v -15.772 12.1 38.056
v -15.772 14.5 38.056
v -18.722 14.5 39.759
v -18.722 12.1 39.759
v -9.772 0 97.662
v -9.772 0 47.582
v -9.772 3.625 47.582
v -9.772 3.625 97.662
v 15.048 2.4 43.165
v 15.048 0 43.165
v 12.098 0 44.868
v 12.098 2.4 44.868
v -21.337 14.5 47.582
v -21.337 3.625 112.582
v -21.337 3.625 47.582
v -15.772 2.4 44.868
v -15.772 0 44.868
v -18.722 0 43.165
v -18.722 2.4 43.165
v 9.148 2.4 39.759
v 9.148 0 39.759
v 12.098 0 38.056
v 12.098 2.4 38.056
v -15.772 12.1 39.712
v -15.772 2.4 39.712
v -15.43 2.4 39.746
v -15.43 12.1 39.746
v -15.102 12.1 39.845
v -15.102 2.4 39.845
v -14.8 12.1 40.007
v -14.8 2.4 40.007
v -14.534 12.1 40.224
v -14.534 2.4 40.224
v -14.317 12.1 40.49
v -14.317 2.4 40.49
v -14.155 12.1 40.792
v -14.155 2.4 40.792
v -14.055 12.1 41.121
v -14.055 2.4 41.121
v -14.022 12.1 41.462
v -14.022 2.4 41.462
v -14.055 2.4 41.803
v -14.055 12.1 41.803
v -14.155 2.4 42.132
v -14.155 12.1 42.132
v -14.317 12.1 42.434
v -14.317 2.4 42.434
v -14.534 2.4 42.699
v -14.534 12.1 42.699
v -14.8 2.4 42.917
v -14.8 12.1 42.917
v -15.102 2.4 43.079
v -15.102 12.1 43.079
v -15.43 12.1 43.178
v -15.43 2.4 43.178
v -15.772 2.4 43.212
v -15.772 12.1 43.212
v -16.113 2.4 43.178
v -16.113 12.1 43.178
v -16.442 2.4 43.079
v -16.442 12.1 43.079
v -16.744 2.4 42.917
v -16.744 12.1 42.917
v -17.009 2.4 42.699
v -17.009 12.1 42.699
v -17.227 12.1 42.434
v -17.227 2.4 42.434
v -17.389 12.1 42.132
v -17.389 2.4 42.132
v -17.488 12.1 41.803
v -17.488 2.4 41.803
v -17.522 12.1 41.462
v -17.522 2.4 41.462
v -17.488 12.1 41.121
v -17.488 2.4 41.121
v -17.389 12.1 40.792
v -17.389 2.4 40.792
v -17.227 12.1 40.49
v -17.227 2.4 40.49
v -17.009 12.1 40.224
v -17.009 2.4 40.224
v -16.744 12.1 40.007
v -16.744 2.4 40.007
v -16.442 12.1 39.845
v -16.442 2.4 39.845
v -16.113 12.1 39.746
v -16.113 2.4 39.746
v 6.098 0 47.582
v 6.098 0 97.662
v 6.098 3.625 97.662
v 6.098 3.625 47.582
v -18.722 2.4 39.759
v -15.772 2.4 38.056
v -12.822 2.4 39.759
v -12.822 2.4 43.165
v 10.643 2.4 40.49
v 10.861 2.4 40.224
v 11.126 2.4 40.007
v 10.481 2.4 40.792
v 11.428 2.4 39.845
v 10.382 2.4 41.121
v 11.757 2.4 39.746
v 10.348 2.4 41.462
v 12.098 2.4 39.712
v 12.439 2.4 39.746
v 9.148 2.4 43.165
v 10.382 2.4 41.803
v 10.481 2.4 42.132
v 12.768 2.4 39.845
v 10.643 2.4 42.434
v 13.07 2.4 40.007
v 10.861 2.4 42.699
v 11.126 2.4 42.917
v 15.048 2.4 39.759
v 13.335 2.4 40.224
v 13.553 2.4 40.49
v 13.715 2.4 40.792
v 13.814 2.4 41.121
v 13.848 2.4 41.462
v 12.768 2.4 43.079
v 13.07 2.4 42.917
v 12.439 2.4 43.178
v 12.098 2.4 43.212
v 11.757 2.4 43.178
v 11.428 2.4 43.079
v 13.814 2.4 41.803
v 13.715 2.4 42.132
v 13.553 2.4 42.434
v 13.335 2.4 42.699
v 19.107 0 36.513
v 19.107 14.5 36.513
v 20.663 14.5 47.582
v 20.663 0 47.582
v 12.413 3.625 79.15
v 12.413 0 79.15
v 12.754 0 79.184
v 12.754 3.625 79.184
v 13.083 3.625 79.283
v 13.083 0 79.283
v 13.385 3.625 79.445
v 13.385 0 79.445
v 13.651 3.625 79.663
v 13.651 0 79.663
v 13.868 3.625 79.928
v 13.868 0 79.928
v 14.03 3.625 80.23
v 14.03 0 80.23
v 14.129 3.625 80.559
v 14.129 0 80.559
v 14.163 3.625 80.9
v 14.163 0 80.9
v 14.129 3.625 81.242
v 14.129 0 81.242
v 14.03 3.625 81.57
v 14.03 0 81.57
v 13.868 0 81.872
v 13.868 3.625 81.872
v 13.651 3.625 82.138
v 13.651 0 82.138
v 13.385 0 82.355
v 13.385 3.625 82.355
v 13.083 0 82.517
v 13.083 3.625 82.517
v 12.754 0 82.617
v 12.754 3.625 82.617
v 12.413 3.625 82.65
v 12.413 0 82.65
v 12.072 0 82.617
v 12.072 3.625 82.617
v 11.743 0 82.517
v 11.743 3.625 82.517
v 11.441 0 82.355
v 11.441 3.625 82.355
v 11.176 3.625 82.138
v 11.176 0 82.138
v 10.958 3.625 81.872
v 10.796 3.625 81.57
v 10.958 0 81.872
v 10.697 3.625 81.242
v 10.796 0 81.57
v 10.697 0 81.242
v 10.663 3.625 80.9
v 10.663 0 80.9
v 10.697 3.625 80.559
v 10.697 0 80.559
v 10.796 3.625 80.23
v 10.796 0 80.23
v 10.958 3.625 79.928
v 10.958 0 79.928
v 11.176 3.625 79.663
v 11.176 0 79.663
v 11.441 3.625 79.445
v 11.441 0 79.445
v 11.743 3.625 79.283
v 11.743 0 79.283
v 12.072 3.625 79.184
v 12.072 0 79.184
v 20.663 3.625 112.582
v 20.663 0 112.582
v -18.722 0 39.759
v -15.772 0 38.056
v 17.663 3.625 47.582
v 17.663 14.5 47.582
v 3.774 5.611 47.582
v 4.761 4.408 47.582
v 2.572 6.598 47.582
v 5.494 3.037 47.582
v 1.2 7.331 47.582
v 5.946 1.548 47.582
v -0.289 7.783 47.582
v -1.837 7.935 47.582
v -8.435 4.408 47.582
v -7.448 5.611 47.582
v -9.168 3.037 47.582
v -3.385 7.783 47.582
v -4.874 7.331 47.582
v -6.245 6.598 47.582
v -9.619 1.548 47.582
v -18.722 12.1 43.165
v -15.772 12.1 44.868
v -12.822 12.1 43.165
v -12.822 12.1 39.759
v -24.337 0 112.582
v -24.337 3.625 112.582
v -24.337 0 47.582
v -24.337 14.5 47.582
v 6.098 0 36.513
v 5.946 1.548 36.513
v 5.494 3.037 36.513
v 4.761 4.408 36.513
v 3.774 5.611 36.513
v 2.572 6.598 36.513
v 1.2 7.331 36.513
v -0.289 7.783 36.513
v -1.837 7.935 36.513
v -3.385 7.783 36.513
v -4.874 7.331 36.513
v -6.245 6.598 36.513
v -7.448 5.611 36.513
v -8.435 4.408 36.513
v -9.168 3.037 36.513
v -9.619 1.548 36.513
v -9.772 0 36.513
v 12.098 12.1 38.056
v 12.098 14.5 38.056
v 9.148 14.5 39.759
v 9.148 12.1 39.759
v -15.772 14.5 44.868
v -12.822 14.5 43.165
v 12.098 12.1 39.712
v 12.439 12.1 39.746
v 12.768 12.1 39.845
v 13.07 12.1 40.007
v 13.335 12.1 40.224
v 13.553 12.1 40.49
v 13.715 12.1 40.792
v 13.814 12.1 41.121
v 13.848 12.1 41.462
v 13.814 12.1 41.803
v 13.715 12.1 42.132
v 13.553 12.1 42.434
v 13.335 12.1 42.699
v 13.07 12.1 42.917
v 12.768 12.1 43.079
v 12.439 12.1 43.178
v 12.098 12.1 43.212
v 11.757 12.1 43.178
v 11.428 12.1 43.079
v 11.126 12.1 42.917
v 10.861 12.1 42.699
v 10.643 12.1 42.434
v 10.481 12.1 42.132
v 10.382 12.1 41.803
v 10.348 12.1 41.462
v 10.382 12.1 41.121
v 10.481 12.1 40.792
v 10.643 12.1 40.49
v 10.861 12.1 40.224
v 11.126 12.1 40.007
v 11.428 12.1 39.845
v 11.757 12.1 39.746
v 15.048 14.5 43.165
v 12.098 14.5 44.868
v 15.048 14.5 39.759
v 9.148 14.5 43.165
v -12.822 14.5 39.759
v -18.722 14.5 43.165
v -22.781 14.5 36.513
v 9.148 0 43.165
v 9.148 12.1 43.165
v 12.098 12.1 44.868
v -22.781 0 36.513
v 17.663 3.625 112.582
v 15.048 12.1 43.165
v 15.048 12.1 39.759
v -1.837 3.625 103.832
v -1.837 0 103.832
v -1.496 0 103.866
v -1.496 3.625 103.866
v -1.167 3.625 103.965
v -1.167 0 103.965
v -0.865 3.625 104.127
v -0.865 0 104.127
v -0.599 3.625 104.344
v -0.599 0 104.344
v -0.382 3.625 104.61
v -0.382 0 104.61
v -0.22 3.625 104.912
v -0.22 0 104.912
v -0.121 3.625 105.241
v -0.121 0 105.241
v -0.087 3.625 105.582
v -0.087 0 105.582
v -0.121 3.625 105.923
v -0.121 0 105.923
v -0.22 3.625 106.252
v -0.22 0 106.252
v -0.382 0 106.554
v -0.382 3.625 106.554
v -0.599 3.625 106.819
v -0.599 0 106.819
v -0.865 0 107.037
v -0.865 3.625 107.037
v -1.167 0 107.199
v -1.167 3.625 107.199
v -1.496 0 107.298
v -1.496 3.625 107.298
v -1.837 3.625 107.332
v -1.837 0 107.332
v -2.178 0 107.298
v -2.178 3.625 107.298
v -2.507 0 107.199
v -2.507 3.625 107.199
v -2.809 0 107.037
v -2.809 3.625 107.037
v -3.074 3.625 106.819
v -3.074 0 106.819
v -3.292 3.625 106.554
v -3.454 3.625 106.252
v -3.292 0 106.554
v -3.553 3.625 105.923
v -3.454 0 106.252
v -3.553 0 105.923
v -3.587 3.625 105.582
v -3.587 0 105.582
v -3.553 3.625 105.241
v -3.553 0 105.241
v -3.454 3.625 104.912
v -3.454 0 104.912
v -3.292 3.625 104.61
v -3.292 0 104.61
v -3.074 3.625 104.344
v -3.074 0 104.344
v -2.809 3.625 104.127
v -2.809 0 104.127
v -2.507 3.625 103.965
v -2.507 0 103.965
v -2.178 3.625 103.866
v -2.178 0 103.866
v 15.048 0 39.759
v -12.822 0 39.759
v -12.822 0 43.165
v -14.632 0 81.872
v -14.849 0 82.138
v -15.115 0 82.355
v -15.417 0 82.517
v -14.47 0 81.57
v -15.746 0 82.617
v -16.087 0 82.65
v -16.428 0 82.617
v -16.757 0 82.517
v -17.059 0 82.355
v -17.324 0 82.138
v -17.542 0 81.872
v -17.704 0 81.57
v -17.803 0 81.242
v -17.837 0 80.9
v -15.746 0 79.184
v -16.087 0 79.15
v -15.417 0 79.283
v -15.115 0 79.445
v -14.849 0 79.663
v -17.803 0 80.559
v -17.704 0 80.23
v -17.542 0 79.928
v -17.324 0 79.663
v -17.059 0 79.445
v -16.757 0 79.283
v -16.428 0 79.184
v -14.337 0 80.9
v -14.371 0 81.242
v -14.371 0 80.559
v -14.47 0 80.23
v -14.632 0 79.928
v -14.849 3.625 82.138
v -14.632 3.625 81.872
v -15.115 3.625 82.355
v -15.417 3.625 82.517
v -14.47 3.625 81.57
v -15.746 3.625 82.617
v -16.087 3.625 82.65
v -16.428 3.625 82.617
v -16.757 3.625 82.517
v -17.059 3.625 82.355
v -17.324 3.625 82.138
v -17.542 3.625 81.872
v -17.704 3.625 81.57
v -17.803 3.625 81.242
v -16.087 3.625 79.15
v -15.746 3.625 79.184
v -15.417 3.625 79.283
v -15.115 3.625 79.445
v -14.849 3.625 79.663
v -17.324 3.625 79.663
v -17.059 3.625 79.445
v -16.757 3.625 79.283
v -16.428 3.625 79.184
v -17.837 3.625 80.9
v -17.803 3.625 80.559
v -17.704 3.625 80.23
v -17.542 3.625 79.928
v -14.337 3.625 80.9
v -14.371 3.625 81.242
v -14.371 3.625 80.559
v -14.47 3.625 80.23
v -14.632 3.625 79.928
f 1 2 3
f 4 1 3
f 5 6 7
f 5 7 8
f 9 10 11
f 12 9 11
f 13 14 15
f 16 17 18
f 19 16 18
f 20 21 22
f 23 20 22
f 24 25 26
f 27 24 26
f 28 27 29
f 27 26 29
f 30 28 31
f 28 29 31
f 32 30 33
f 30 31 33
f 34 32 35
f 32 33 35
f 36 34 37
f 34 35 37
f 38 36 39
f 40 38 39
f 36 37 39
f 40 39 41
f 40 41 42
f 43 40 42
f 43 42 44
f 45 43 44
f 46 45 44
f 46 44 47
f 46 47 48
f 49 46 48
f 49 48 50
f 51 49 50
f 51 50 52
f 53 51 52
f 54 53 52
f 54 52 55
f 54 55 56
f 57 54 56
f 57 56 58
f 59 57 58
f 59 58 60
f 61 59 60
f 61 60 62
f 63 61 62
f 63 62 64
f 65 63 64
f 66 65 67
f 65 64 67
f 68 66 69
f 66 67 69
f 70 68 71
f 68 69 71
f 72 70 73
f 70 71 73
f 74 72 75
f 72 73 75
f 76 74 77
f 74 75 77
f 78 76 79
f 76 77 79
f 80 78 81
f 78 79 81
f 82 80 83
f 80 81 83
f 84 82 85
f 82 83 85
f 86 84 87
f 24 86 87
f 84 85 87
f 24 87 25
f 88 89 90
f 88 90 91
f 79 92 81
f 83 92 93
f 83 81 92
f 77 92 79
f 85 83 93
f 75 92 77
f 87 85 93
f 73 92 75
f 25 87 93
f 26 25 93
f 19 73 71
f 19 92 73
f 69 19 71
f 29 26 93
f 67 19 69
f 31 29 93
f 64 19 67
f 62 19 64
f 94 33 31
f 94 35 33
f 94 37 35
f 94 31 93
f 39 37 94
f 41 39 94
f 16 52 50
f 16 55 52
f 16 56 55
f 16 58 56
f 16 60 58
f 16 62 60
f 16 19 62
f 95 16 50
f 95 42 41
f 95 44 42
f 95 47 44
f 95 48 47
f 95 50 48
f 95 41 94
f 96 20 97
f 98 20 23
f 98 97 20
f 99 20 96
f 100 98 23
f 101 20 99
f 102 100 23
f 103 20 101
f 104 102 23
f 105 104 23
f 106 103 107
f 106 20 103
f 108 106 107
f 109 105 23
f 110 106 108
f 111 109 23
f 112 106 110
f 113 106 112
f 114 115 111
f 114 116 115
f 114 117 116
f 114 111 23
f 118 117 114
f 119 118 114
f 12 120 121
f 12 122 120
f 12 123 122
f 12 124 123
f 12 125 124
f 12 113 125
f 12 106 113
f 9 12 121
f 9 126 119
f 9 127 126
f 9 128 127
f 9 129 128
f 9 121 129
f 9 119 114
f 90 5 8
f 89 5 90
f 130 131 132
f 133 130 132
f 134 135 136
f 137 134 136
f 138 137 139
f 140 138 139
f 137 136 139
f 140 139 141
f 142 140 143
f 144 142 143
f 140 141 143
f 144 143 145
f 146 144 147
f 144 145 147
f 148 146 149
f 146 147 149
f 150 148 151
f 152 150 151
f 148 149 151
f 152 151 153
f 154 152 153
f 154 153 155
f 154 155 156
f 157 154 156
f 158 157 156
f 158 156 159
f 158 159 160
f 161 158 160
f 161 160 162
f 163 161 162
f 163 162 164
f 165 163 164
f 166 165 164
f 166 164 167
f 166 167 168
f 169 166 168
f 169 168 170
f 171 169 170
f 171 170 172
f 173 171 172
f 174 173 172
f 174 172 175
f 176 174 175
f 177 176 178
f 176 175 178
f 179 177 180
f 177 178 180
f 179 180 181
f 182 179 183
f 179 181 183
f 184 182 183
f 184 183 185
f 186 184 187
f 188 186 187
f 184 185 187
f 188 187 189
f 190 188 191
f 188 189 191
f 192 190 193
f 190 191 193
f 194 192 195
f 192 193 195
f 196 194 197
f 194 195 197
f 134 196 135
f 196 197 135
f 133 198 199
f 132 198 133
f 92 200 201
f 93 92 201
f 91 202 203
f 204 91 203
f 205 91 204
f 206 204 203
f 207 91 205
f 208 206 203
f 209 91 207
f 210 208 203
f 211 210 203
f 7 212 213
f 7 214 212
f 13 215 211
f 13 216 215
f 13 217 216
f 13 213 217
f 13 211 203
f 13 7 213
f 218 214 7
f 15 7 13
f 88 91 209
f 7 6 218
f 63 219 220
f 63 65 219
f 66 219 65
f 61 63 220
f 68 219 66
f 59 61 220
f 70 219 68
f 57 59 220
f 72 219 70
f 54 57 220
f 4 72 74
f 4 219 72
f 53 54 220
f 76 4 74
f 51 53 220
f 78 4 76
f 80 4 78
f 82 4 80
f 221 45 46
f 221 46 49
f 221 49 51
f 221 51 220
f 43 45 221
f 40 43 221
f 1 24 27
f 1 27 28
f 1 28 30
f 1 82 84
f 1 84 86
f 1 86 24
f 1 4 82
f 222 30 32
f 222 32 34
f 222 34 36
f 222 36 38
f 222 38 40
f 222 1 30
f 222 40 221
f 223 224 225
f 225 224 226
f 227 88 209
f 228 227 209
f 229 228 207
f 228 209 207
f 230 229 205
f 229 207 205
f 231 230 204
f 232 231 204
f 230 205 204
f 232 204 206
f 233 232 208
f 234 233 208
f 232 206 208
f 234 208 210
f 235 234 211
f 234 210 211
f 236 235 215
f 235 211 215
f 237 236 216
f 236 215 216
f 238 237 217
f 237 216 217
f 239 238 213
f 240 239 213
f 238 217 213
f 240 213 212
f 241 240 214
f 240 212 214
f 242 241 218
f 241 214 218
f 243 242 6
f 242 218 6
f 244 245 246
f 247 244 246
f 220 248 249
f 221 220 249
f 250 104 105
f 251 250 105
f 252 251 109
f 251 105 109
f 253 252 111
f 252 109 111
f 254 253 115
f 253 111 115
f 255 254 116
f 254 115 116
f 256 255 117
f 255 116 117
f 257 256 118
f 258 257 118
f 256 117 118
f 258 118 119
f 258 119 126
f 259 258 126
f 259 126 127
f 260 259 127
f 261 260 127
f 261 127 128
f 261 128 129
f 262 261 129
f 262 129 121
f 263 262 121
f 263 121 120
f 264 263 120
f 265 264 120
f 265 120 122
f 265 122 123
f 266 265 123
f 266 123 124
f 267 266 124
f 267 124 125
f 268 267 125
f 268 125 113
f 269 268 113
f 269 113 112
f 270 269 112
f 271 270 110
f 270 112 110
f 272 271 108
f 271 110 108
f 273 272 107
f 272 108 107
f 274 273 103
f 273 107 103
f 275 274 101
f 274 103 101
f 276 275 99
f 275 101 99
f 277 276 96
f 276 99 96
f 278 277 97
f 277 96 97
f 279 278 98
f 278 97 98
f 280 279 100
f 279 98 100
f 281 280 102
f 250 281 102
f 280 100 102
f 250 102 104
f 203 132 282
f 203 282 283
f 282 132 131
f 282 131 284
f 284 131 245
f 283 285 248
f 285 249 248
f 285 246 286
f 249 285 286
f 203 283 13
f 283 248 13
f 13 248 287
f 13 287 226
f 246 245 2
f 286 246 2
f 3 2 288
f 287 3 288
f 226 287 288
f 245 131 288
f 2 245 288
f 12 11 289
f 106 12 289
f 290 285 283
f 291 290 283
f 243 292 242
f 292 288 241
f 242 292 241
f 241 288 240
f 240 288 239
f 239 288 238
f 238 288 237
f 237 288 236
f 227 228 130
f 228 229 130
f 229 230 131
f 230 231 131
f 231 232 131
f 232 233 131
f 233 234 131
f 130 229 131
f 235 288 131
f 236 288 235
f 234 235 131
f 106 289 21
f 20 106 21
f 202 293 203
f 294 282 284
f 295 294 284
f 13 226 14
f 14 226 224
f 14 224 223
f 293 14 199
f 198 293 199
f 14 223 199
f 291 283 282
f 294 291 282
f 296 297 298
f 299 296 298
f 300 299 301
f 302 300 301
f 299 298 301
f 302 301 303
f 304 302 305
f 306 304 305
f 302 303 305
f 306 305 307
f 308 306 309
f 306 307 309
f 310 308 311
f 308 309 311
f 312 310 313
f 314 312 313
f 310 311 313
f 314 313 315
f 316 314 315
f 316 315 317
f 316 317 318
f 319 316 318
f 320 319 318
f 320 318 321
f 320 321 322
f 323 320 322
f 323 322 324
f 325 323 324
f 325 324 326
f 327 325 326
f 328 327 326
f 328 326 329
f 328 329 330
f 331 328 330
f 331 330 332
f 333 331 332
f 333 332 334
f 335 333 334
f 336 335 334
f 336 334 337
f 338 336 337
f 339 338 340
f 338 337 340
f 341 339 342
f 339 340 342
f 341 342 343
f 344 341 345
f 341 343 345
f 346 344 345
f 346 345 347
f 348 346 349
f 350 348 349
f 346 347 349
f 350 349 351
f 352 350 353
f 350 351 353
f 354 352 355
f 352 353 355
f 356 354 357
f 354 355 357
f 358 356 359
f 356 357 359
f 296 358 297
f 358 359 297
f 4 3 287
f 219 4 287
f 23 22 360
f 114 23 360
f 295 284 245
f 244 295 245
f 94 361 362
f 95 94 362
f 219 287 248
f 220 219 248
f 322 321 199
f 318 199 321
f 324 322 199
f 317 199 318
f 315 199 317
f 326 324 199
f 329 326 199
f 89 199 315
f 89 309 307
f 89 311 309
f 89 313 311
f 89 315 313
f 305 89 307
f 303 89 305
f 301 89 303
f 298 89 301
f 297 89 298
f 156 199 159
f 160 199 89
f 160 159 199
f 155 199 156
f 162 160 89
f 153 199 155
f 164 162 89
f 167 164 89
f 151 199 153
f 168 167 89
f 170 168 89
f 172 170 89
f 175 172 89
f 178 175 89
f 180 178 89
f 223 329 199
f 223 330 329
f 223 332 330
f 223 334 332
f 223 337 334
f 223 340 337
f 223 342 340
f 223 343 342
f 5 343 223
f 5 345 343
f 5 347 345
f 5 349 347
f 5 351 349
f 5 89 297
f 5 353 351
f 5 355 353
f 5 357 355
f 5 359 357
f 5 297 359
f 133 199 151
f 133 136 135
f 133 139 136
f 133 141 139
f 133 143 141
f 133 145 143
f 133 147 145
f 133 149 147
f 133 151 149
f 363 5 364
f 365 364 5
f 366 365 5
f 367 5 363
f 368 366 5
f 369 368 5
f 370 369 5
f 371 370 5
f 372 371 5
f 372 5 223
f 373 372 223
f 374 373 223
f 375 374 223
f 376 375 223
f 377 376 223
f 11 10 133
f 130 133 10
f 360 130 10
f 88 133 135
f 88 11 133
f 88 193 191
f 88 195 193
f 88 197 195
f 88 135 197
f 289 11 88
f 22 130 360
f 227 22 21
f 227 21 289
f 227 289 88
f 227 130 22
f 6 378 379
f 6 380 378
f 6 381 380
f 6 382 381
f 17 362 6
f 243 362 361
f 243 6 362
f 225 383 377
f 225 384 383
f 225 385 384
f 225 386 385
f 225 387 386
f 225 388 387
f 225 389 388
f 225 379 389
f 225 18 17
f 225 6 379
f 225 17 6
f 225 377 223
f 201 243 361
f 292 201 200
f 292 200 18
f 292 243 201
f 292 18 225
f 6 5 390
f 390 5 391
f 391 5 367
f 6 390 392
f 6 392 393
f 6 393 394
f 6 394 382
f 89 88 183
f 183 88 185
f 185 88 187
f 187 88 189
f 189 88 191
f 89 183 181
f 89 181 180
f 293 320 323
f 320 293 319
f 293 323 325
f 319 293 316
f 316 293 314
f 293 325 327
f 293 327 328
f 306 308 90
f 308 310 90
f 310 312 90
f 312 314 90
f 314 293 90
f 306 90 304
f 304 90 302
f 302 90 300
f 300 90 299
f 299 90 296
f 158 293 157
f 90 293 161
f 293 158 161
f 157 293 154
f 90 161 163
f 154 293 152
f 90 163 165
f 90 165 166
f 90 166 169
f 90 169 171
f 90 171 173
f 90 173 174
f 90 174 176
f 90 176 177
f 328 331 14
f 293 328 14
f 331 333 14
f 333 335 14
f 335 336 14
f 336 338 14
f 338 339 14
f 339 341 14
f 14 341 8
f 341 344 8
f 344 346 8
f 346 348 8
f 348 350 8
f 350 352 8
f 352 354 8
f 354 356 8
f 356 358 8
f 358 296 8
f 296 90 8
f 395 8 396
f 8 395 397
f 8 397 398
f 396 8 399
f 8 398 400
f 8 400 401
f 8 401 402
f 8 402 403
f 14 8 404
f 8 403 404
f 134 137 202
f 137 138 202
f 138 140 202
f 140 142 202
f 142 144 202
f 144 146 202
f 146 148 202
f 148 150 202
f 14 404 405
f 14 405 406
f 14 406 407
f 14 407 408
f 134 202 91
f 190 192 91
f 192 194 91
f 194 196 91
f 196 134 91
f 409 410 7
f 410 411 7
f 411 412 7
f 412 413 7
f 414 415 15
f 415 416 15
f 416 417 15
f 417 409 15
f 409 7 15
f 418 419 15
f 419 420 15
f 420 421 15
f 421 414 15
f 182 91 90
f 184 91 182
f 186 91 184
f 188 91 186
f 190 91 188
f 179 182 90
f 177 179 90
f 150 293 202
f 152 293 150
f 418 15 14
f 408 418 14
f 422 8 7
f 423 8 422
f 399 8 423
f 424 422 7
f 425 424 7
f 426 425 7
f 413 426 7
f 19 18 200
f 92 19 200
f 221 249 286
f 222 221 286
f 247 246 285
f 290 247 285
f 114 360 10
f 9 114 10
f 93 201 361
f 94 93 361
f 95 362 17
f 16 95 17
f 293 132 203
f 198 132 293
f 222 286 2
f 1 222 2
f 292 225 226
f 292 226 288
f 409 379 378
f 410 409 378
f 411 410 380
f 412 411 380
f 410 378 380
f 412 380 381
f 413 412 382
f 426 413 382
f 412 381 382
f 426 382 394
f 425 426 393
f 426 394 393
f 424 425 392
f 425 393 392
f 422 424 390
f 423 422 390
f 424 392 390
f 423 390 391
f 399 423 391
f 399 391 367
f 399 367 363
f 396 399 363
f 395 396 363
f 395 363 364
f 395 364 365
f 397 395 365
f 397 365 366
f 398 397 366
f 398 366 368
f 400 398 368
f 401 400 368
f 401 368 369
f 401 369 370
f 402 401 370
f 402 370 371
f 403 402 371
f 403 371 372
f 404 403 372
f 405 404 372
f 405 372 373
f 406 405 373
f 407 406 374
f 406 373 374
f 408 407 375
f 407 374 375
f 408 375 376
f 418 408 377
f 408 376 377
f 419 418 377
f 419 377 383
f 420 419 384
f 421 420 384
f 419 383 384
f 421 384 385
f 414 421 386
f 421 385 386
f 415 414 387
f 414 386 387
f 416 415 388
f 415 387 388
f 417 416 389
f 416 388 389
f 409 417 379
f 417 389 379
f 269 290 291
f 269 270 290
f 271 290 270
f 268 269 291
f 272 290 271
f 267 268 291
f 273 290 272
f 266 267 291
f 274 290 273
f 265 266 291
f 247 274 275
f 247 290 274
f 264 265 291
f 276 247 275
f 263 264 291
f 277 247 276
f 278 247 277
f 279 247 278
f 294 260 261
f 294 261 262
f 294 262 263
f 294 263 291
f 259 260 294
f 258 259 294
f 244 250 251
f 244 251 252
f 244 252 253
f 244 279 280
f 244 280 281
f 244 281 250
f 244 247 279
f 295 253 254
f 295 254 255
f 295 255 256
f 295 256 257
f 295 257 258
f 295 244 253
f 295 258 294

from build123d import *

# Parameters (mm, degrees)
BOSS_EXTRUDE3_DEPTH              = 14.5
SKETCH8_R                        = 7.935
CUT_EXTRUDE3_DEPTH               = 88
CUT_EXTRUDE9_DEPTH               = 2.4
F_39_0_13779528_DIAMETER_HOLE1_D = 3.500000112
CUT_EXTRUDE10_DEPTH              = 22.4
CUT_EXTRUDE11_DEPTH              = 2.4
BOSS_EXTRUDE7_DEPTH              = 3.625
F_39_0_13779528_DIAMETER_HOLE2_D = 3.500000112
BOSS_EXTRUDE10_DEPTH             = 3
BOSS_EXTRUDE11_DEPTH             = 3


with BuildPart() as part:
    # Sketch6 → Boss-Extrude3 (new body)
    with BuildSketch(Plane(origin=(0, 0, 0), x_dir=(1, 0, 0), z_dir=(0, 1, 0))):
        Polygon((-16.836914056, 5.783353512), (13.163085944, 5.783353512), (20.663085944, -47.581919406), (-24.336914056, -47.581919406), align=None)
    extrude(amount=BOSS_EXTRUDE3_DEPTH)

    # Sketch8 → Cut-Extrude3 (cut)
    with BuildSketch(Plane.XY.offset(47.581919406)):
        with Locations((-1.836914056, 0)):
            Circle(SKETCH8_R)
    extrude(amount=-CUT_EXTRUDE3_DEPTH, mode=Mode.SUBTRACT)

    # Sketch18 → Cut-Extrude9 (cut)
    with BuildSketch(Plane(origin=(0, 14.5, 0), x_dir=(1, 0, 0), z_dir=(0, 1, 0))):
        Polygon((-15.771819769, -44.868285994), (-12.821819769, -43.1651027), (-12.821819769, -39.758736112), (-15.771819769, -38.055552818), (-18.721819769, -39.758736112), (-18.721819769, -43.1651027), align=None)
        Polygon((12.097991657, -44.868285994), (15.047991657, -43.1651027), (15.047991657, -39.758736112), (12.097991657, -38.055552818), (9.147991657, -39.758736112), (9.147991657, -43.1651027), align=None)
        Polygon((11.389331688, -26.016021021), (14.389331688, -24.283970214), (14.389331688, -20.819868599), (11.389331688, -19.087817791), (8.389331688, -20.819868599), (8.389331688, -24.283970214), align=None)
        Polygon((-15.0631598, -26.016021021), (-12.0631598, -24.283970214), (-12.0631598, -20.819868599), (-15.0631598, -19.087817791), (-18.0631598, -20.819868599), (-18.0631598, -24.283970214), align=None)
    extrude(amount=-CUT_EXTRUDE9_DEPTH, mode=Mode.SUBTRACT)

    # #39 (0.13779528) Diameter Hole1 (through all)
    with Locations(Plane(origin=(-15.0631598, 14.5, 22.551919406), x_dir=(0, 0, 1), z_dir=(0, 1, 0))):
        with Locations((0, 0), (0, 26.452491488), (18.91, -0.708659969), (18.91, 27.161151457)):
            Hole(F_39_0_13779528_DIAMETER_HOLE1_D / 2)

    # Sketch22 → Cut-Extrude10 (cut)
    with BuildSketch(Plane(origin=(0, 14.5, 0), x_dir=(1, 0, 0), z_dir=(0, 1, 0))):
        Polygon((-22.781301734, -36.51316259), (19.107473622, -36.51316259), (13.163085944, 5.783353512), (-16.836914056, 5.783353512), align=None)
    extrude(amount=-CUT_EXTRUDE10_DEPTH, mode=Mode.SUBTRACT)

    # Sketch24 → Cut-Extrude11 (cut)
    with BuildSketch(Plane.XZ):
        Polygon((-15.771819769, 38.055552818), (-12.821819769, 39.758736112), (-12.821819769, 43.1651027), (-15.771819769, 44.868285994), (-18.721819769, 43.1651027), (-18.721819769, 39.758736112), align=None)
        Polygon((12.097991657, 38.055552818), (15.047991657, 39.758736112), (15.047991657, 43.1651027), (12.097991657, 44.868285994), (9.147991657, 43.1651027), (9.147991657, 39.758736112), align=None)
    extrude(amount=-CUT_EXTRUDE11_DEPTH, mode=Mode.SUBTRACT)

    # Sketch27 → Boss-Extrude7 (add)
    with BuildSketch(Plane(origin=(0, 0, 0), x_dir=(1, 0, 0), z_dir=(0, 1, 0))):
        Polygon((6.098085944, -47.581919406), (20.663085944, -47.581919406), (20.663085944, -112.581919406), (-9.771914056, -112.581919406), (-24.336914056, -112.581919406), (-24.336914056, -47.581919406), (-9.771914056, -47.581919406), (-9.771914056, -97.661919406), (6.098085944, -97.661919406), align=None)
    extrude(amount=BOSS_EXTRUDE7_DEPTH)

    # #39 (0.13779528) Diameter Hole2 (through all)
    with Locations(Plane(origin=(-16.086914056, 3.625, 80.900195398), x_dir=(0, 0, 1), z_dir=(0, 1, 0))):
        with Locations((0, 0), (24.681724008, 14.25), (0, 28.5)):
            Hole(F_39_0_13779528_DIAMETER_HOLE2_D / 2)

    # Sketch39 → Boss-Extrude10 (add)
    with BuildSketch(Plane(origin=(20.663085944, 0, 0), x_dir=(0, 0, -1), z_dir=(1, 0, 0))):
        Polygon((-47.581919406, 14.5), (-112.581919406, 3.625), (-47.581919406, 3.625), align=None)
    extrude(amount=-BOSS_EXTRUDE10_DEPTH)

    # Sketch40 → Boss-Extrude11 (add)
    with BuildSketch(Plane.ZY.offset(24.336914056)):
        Polygon((47.581919406, 14.5), (112.581919406, 3.625), (47.581919406, 3.625), align=None)
    extrude(amount=-BOSS_EXTRUDE11_DEPTH)


solid = part.part
